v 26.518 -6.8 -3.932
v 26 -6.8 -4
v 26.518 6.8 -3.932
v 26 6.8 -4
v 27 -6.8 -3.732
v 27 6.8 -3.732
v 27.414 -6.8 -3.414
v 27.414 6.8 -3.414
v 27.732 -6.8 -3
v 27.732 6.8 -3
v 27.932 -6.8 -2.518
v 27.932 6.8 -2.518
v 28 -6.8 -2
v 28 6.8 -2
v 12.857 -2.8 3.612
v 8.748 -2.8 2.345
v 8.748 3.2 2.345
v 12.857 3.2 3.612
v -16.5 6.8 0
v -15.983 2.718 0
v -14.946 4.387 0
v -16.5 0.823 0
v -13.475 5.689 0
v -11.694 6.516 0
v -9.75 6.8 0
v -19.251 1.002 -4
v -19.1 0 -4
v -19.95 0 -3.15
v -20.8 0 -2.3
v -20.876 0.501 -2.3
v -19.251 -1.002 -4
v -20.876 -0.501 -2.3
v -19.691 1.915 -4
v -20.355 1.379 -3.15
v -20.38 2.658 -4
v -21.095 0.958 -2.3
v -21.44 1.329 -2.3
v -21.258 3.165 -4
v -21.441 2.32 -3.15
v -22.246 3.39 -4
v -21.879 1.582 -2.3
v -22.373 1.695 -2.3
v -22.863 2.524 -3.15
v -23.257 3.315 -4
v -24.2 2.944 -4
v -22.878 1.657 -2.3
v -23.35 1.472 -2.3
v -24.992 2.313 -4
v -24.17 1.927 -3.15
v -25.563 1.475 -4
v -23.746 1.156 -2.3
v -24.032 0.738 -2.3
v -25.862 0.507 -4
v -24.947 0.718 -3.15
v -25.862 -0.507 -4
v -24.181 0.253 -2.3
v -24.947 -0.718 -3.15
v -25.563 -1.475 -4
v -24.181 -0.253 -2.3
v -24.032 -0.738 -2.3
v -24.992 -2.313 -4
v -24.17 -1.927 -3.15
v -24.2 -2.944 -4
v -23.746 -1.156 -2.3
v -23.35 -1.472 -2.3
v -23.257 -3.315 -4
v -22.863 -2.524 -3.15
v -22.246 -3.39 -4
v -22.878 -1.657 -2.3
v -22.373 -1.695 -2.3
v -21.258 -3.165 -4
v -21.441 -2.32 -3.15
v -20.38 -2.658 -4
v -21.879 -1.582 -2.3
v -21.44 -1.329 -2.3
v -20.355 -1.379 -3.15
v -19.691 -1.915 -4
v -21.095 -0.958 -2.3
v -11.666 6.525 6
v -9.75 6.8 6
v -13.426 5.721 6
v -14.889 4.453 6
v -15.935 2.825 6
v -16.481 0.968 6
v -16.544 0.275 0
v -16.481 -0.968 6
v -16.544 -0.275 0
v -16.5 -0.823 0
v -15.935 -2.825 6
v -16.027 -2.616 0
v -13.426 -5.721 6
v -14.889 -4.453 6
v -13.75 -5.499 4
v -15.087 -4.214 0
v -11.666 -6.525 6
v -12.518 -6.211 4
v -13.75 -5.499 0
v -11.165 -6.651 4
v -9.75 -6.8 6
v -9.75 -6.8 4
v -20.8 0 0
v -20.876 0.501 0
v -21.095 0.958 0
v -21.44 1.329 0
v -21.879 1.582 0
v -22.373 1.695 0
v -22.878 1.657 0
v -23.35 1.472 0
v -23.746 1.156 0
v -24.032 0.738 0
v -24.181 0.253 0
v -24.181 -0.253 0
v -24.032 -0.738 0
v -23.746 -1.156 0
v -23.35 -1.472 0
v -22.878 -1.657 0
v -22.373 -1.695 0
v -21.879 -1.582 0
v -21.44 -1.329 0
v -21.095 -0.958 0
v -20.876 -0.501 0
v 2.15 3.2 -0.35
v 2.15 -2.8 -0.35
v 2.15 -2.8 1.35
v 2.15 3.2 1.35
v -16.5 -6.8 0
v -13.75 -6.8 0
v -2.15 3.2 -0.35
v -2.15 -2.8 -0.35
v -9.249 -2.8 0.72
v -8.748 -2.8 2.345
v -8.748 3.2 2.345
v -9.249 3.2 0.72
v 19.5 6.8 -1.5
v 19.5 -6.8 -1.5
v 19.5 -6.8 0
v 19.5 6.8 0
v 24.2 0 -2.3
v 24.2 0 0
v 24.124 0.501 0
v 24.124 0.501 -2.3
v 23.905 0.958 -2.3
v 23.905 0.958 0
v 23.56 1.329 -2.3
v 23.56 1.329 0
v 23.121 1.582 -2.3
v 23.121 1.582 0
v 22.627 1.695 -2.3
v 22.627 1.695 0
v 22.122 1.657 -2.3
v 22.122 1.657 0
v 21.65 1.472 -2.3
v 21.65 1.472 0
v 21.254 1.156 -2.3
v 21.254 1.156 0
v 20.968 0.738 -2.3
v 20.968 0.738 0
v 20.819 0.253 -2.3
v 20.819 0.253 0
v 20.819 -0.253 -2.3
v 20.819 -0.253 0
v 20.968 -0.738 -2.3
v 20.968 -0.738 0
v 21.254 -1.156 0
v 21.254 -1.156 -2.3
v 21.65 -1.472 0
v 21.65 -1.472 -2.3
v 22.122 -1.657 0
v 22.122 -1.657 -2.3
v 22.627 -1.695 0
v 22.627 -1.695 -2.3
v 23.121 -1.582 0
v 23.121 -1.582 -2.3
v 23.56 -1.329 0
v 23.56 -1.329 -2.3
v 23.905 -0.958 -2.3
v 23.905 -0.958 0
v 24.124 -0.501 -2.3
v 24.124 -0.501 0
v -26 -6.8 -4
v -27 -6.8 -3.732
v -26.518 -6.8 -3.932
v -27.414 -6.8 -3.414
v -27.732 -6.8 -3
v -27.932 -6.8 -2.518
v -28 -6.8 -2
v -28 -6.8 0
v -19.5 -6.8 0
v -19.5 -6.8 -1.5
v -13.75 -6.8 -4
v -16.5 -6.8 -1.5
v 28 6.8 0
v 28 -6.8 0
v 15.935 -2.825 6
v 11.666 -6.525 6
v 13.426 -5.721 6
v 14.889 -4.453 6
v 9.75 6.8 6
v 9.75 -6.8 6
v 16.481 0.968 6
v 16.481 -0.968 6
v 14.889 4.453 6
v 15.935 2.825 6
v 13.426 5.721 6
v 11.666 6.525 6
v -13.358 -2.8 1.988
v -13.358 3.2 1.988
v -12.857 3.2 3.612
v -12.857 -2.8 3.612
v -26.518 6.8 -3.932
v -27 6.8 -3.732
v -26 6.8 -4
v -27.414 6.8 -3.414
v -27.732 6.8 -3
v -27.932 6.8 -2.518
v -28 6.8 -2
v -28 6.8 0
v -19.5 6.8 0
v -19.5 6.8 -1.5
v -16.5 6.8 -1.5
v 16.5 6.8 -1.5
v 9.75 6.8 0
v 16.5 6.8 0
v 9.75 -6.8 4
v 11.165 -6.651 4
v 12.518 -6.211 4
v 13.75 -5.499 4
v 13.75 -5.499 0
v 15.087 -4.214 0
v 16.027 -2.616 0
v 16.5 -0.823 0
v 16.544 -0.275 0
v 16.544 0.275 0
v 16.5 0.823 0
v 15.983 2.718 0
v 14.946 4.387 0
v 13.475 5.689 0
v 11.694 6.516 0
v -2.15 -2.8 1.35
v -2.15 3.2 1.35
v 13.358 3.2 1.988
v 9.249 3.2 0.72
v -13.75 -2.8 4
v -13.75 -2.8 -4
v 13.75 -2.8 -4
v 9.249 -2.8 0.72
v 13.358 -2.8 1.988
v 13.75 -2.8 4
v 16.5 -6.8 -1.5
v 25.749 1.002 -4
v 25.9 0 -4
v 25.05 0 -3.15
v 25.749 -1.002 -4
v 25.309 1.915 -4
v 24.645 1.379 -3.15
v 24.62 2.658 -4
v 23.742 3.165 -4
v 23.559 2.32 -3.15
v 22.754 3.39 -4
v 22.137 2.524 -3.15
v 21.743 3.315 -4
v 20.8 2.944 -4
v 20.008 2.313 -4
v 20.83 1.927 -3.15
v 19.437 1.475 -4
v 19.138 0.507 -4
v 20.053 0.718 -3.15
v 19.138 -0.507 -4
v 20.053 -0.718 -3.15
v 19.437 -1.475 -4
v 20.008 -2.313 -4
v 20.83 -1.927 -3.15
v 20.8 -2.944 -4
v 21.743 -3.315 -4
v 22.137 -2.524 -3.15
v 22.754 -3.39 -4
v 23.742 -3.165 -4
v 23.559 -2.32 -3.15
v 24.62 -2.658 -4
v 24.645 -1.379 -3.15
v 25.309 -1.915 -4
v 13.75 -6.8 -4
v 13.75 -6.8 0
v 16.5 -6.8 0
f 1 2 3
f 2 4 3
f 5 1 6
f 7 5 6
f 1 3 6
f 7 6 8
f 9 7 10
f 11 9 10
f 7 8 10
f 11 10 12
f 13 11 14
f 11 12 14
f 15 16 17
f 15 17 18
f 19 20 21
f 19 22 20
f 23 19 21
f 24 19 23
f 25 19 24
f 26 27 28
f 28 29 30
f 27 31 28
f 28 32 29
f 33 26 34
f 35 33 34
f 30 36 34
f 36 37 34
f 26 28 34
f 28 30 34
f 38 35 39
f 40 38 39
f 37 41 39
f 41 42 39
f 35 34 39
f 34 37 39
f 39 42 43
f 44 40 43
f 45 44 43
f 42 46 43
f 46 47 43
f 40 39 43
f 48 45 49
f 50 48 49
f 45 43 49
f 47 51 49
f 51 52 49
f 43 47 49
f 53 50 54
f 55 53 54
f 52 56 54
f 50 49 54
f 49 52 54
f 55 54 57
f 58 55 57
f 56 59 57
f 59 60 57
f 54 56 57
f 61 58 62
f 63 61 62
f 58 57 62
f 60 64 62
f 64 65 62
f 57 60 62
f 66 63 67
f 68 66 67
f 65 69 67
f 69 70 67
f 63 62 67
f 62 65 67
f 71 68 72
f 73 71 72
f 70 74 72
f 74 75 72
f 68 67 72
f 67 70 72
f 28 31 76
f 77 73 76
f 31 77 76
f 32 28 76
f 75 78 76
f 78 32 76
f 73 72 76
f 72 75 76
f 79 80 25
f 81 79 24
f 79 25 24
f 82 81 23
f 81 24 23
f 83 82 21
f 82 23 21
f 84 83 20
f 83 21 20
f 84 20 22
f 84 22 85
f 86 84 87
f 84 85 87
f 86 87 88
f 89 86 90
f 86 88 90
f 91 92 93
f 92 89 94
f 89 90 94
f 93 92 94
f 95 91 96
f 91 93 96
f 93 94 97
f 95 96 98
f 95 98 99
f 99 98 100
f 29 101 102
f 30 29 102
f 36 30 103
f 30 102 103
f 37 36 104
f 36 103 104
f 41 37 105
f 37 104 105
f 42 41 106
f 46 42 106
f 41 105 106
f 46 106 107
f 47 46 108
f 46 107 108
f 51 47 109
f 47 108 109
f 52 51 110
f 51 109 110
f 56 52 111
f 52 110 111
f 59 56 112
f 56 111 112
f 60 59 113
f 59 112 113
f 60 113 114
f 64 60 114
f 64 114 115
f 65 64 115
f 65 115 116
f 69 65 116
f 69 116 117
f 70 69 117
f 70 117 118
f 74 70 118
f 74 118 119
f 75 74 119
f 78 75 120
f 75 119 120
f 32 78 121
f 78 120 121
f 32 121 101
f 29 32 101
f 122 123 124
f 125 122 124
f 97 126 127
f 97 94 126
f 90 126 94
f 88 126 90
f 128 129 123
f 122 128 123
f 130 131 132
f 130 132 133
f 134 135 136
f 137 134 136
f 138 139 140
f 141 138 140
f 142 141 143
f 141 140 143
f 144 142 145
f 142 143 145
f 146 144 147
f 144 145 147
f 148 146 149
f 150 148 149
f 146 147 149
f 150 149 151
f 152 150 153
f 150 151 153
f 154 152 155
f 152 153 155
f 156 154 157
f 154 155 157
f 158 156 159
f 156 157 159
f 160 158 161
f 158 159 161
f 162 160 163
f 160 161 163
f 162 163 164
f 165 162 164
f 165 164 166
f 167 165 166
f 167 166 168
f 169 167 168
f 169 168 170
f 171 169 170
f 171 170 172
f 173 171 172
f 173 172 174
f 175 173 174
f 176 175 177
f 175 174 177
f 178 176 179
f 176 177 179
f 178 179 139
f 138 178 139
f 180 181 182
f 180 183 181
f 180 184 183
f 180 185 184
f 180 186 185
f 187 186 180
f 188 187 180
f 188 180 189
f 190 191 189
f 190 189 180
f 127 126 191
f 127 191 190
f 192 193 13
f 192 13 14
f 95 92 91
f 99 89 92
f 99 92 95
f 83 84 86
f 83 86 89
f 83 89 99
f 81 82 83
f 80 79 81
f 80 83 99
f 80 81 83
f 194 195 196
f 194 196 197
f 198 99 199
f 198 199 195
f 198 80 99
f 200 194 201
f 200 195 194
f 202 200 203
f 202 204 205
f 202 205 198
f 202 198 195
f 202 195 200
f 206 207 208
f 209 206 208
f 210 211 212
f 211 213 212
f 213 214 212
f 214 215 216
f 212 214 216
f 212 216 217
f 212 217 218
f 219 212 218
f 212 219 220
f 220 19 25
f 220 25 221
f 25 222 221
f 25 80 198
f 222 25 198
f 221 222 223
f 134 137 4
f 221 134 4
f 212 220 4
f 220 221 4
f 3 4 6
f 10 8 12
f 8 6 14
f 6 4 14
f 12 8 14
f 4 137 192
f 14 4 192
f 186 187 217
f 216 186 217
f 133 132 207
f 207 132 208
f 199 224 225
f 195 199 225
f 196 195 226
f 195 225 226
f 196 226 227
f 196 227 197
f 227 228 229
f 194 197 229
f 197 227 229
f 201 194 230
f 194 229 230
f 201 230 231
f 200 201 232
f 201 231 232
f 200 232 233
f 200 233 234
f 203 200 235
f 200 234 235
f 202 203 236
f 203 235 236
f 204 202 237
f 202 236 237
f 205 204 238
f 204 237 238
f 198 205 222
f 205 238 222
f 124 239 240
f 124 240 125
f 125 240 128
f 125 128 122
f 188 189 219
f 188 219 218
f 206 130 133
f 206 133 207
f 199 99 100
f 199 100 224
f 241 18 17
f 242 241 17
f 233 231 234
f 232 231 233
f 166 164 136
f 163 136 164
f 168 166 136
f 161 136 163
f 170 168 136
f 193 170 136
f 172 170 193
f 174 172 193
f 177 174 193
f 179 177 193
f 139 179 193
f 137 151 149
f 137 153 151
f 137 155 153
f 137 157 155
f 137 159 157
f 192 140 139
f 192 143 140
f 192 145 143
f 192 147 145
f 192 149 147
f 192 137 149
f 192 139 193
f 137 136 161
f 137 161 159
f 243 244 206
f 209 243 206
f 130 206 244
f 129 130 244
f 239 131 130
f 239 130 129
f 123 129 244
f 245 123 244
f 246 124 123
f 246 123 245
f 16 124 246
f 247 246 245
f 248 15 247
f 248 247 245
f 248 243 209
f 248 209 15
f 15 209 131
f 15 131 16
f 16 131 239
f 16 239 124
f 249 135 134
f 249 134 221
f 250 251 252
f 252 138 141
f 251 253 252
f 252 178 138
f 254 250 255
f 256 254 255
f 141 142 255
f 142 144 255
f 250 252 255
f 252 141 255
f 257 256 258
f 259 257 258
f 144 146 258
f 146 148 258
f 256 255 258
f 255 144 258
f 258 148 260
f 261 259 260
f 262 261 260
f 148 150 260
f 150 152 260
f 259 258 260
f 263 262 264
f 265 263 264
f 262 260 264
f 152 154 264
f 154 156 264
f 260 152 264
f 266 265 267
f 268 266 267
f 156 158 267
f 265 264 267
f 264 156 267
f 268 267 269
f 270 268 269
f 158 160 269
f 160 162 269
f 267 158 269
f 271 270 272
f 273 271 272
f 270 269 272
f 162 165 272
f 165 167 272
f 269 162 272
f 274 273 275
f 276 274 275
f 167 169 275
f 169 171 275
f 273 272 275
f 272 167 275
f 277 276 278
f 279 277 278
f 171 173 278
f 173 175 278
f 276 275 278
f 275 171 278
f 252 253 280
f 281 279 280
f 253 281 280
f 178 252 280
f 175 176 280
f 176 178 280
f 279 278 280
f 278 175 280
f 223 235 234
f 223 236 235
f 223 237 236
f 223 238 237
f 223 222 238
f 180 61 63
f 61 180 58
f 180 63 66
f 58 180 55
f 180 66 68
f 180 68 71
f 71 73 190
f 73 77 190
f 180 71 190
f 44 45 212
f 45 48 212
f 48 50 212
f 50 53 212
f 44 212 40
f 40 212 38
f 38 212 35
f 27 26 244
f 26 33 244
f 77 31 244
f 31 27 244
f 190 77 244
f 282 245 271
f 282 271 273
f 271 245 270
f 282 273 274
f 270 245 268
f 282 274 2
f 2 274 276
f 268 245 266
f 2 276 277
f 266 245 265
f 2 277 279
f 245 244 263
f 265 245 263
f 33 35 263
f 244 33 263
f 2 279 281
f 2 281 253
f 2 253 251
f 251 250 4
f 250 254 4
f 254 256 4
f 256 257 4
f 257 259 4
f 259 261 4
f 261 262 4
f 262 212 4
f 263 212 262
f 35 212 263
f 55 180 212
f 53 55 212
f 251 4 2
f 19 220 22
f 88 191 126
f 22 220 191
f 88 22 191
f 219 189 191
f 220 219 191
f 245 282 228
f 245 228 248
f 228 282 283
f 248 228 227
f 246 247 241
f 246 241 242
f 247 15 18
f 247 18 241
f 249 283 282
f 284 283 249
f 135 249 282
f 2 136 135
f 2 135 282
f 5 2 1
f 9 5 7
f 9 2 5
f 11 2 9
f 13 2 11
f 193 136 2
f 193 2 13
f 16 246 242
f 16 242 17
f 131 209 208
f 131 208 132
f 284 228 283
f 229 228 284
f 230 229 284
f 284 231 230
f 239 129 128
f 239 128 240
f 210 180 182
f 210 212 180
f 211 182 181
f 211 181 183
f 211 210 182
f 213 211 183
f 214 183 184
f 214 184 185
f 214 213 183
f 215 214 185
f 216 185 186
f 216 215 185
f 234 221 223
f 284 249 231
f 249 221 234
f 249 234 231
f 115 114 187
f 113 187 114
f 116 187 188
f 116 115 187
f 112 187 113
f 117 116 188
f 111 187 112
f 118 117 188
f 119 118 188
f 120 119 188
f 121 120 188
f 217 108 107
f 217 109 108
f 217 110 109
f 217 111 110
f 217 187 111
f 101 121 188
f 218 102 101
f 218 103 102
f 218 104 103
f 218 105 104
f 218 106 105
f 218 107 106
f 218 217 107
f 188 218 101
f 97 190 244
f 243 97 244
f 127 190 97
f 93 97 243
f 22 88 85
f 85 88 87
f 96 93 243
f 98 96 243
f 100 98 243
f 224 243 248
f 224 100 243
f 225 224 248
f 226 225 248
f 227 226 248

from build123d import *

# Parameters (mm, degrees)
SKETCH_W        = 56
SKETCH_H        = 13.6
SKETCH_R        = 1.7
PAD_DEPTH       = 4
PAD001_DEPTH    = 6
SKETCH002_W     = 4.3
SKETCH002_H     = 1.7
POCKET_DEPTH    = 10
SKETCH003_W     = 27.5
SKETCH003_H     = 8.7
POCKET001_DEPTH = 4
SKETCH004_W     = 3
SKETCH004_H     = 1.5
POCKET002_DEPTH = 130.578947
CHAMFER_SIZE    = 1.7
CHAMFER001_SIZE = 1.7
FILLET_R        = 2
FILLET001_R     = 2


with BuildPart() as part:
    # Sketch → Pad (new body)
    with BuildSketch(Plane.XY):
        Rectangle(SKETCH_W, SKETCH_H)
        with Locations((-22.5, 0)):
            Circle(SKETCH_R, mode=Mode.SUBTRACT)
        with Locations((22.5, 0)):
            Circle(SKETCH_R, mode=Mode.SUBTRACT)
    extrude(amount=-PAD_DEPTH)

    # Sketch001 → Pad001 (new body)
    with BuildSketch(Plane.XY):
        with BuildLine():
            ThreePointArc((-9.75, 6.8), (-16.55, 0), (-9.75, -6.8))
            Line((-9.75, -6.8), (9.75, -6.8))
            ThreePointArc((9.75, -6.8), (16.55, 0), (9.75, 6.8))
            Line((-9.75, 6.8), (9.75, 6.8))
        make_face()
    extrude(amount=PAD001_DEPTH)

    # Sketch002 → Pocket (cut)
    with BuildSketch(Plane.XZ.offset(6.8)):
        Polygon((-12.857344, 3.612012), (-8.748385, 2.344555), (-9.249472, 0.720082), (-13.358432, 1.98754), align=None)
        with Locations((0, 0.5)):
            Rectangle(SKETCH002_W, SKETCH002_H)
        Polygon((8.748385, 2.344555), (12.857344, 3.612012), (13.358432, 1.98754), (9.249472, 0.720082), align=None)
    extrude(amount=-POCKET_DEPTH, mode=Mode.SUBTRACT)

    # Sketch003 → Pocket001 (cut)
    with BuildSketch(Plane.XZ.offset(6.8)):
        with Locations((0, -0.35)):
            Rectangle(SKETCH003_W, SKETCH003_H)
    extrude(amount=-POCKET001_DEPTH, mode=Mode.SUBTRACT)

    # Sketch004 → Pocket002 (cut, through all)
    with BuildSketch(Plane.XZ.offset(6.8)):
        with Locations((-18, -0.75)):
            Rectangle(SKETCH004_W, SKETCH004_H)
    pocket002 = extrude(amount=-POCKET002_DEPTH, mode=Mode.SUBTRACT)

    # Mirrored: Pocket002 across Sketch004 V_Axis
    add(pocket002.mirror(Plane(origin=(0, -6.8, 0), x_dir=(0, -1, 0), z_dir=(1, 0, 0))), mode=Mode.SUBTRACT)

    # Chamfer
    chamfer_edges = [part.edges().sort_by_distance(p)[0] for p in [
        (-24.2, 0, -4),
    ]]
    chamfer(chamfer_edges, length=CHAMFER_SIZE)

    # Chamfer001
    chamfer001_edges = [part.edges().sort_by_distance(p)[0] for p in [
        (20.8, 0, -4),
    ]]
    chamfer(chamfer001_edges, length=CHAMFER001_SIZE)

    # Fillet
    fillet_edges = [part.edges().sort_by_distance(p)[0] for p in [
        (-28, 0, -4),
    ]]
    fillet(fillet_edges, radius=FILLET_R)

    # Fillet001
    fillet001_edges = [part.edges().sort_by_distance(p)[0] for p in [
        (28, 0, -4),
    ]]
    fillet(fillet001_edges, radius=FILLET001_R)


solid = part.part
